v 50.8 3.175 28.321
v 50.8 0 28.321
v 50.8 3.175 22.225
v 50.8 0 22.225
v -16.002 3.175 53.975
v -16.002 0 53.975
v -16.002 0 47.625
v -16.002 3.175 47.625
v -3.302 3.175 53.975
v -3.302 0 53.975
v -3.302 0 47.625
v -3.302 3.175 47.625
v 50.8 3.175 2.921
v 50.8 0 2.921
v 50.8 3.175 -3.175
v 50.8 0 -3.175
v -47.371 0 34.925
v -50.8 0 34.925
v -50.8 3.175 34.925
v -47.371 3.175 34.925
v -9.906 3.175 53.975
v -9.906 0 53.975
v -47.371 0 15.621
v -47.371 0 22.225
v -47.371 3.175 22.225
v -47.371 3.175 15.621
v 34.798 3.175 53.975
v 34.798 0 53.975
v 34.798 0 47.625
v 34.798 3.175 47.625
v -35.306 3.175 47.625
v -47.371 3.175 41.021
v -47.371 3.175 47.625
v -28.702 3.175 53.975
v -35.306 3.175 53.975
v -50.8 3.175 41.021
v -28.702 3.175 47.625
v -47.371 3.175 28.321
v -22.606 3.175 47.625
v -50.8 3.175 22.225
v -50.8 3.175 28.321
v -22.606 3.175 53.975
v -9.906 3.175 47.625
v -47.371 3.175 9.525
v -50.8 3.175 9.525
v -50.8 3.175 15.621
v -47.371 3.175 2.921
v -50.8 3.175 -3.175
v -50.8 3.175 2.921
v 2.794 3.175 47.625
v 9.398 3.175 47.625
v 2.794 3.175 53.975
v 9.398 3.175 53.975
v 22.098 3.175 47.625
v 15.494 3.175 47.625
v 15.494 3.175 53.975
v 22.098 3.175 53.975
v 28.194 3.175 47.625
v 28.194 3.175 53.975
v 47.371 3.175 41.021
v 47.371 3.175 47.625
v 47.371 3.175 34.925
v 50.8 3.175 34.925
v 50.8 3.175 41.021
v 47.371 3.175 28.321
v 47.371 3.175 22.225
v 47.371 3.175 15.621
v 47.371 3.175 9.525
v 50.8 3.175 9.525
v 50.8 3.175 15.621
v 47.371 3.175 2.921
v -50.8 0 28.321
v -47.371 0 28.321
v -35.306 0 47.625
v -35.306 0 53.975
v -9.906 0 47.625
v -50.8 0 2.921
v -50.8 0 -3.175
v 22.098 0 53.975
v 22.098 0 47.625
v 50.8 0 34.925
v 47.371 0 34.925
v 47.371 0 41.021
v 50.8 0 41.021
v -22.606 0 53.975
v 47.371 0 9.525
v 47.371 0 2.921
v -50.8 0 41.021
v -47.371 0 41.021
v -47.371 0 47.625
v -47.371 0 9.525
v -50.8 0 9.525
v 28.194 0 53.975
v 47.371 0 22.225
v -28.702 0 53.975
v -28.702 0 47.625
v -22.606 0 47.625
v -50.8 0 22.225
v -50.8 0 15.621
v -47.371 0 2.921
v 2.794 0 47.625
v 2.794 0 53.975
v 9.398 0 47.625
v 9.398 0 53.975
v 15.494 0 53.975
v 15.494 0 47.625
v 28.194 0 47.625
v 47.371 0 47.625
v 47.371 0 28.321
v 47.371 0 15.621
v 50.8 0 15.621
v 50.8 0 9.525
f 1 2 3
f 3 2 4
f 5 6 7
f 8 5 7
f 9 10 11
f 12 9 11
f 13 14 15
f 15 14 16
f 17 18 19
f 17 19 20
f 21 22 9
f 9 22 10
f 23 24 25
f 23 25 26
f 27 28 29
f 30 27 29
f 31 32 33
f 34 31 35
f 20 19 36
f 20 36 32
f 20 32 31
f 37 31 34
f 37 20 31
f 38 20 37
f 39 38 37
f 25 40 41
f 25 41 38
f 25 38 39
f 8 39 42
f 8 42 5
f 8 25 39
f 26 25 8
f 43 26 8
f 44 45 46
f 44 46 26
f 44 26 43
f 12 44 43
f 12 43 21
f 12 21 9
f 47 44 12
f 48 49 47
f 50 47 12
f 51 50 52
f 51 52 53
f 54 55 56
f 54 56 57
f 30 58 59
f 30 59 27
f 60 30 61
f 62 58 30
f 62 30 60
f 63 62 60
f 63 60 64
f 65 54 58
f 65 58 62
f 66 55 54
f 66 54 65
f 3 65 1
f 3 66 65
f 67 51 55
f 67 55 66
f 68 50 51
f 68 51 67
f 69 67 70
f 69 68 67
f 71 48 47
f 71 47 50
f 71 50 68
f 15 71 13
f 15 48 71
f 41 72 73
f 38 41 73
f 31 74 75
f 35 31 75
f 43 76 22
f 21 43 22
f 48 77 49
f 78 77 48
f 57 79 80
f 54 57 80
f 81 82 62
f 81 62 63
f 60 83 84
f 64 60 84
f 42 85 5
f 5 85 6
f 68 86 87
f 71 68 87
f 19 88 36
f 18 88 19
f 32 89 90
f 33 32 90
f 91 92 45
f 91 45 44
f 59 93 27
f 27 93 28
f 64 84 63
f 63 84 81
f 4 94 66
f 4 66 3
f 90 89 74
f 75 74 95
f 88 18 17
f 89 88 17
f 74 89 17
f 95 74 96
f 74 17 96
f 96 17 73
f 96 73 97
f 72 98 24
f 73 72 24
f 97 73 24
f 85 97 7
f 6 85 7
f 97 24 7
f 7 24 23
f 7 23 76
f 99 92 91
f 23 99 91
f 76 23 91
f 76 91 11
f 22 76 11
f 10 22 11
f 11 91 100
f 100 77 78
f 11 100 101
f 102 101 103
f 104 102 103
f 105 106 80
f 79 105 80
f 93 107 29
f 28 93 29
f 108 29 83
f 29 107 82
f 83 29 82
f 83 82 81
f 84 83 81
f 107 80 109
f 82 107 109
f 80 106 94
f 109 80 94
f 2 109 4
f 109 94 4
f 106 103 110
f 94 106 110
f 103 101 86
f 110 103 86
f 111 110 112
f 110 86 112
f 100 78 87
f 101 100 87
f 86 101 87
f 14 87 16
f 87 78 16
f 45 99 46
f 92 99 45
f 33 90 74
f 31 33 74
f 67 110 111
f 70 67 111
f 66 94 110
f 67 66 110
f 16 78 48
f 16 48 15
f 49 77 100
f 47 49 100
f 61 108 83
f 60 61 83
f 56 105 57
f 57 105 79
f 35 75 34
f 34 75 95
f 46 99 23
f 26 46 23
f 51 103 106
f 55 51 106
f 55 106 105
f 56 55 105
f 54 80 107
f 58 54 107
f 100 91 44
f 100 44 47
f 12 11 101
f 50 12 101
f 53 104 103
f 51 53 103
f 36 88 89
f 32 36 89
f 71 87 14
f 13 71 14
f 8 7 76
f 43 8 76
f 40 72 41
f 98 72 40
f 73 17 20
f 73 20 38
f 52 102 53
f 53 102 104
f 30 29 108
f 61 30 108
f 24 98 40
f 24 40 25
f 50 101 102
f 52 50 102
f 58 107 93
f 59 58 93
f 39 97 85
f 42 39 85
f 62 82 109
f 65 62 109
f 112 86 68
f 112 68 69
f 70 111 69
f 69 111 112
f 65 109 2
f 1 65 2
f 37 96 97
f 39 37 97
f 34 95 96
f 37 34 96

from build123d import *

# Parameters (mm, degrees)
SKETCH1_W               = 101.6
SKETCH1_H               = 107.95
BOSS_EXTRUDE1_DEPTH     = 3.175
CUT_EXTRUDE1_DEPTH      = 75.189091179
CUT_EXTRUDE1_DEPTH_BACK = 75.189091179
SKETCH2_W               = 3.429
SKETCH2_H               = 6.604
SKETCH3_W               = 101.6
SKETCH3_H               = 50.8
CUT_EXTRUDE2_DEPTH      = 75.189091179


with BuildPart() as part:
    # Sketch1 → Boss-Extrude1 (new body)
    with BuildSketch(Plane(origin=(0, 0, 0), x_dir=(1, 0, 0), z_dir=(0, 1, 0))):
        Rectangle(SKETCH1_W, SKETCH1_H)
    extrude(amount=BOSS_EXTRUDE1_DEPTH)

    # Sketch2 → Cut-Extrude1 (cut, two sides: drawn at the far end of the back side and taken through both)
    with BuildSketch(Plane(origin=(0, 3.175, 0), x_dir=(1, 0, 0), z_dir=(0, 1, 0)).offset(-CUT_EXTRUDE1_DEPTH_BACK)):
        Polygon((22.098, -47.625), (28.194, -47.625), (28.194, -54.229), (34.798, -54.229), (34.798, -47.625), (47.371, -47.625), (47.371, -41.021), (50.8, -41.021), (50.8, -47.625), (50.8, -92.544961432), (-50.8, -92.544961432), (-50.8, -47.625), (-50.8, -41.021), (-47.371, -41.021), (-47.371, -47.625), (-35.306, -47.625), (-35.306, -54.229), (-28.702, -54.229), (-28.702, -47.625), (-22.606, -47.625), (-22.606, -54.229), (-16.002, -54.229), (-16.002, -47.625), (-9.906, -47.625), (-9.906, -54.229), (-3.302, -54.229), (-3.302, -47.625), (2.794, -47.625), (2.794, -54.229), (9.398, -54.229), (9.398, -47.625), (15.494, -47.625), (15.494, -54.229), (22.098, -54.229), align=None)
        with Locations((-49.0855, 31.75)):
            Rectangle(SKETCH2_W, SKETCH2_H)
        with Locations((-49.0855, 19.177)):
            Rectangle(SKETCH2_W, SKETCH2_H)
        with Locations((-49.0855, 6.477)):
            Rectangle(SKETCH2_W, SKETCH2_H)
        with Locations((-49.0855, -6.223)):
            Rectangle(SKETCH2_W, SKETCH2_H)
        with Locations((-49.0855, -18.923)):
            Rectangle(SKETCH2_W, SKETCH2_H)
        with Locations((-49.0855, -31.623)):
            Rectangle(SKETCH2_W, SKETCH2_H)
        with Locations((49.0855, -31.623)):
            Rectangle(SKETCH2_W, SKETCH2_H)
        with Locations((49.0855, -18.923)):
            Rectangle(SKETCH2_W, SKETCH2_H)
        with Locations((49.0855, -6.223)):
            Rectangle(SKETCH2_W, SKETCH2_H)
        with Locations((49.0855, 6.477)):
            Rectangle(SKETCH2_W, SKETCH2_H)
        with Locations((49.0855, 19.177)):
            Rectangle(SKETCH2_W, SKETCH2_H)
        with Locations((49.0855, 31.75)):
            Rectangle(SKETCH2_W, SKETCH2_H)
        with Locations((49.0855, 44.45)):
            Rectangle(SKETCH2_W, SKETCH2_H)
        with Locations((-49.0855, 44.45)):
            Rectangle(SKETCH2_W, SKETCH2_H)
    extrude(amount=CUT_EXTRUDE1_DEPTH + CUT_EXTRUDE1_DEPTH_BACK, mode=Mode.SUBTRACT)

    # Sketch3 → Cut-Extrude2 (cut, through all)
    with BuildSketch(Plane(origin=(0, 3.175, 0), x_dir=(1, 0, 0), z_dir=(0, 1, 0))):
        with Locations((0, 28.575)):
            Rectangle(SKETCH3_W, SKETCH3_H)
    extrude(amount=-CUT_EXTRUDE2_DEPTH, mode=Mode.SUBTRACT)


solid = part.part
